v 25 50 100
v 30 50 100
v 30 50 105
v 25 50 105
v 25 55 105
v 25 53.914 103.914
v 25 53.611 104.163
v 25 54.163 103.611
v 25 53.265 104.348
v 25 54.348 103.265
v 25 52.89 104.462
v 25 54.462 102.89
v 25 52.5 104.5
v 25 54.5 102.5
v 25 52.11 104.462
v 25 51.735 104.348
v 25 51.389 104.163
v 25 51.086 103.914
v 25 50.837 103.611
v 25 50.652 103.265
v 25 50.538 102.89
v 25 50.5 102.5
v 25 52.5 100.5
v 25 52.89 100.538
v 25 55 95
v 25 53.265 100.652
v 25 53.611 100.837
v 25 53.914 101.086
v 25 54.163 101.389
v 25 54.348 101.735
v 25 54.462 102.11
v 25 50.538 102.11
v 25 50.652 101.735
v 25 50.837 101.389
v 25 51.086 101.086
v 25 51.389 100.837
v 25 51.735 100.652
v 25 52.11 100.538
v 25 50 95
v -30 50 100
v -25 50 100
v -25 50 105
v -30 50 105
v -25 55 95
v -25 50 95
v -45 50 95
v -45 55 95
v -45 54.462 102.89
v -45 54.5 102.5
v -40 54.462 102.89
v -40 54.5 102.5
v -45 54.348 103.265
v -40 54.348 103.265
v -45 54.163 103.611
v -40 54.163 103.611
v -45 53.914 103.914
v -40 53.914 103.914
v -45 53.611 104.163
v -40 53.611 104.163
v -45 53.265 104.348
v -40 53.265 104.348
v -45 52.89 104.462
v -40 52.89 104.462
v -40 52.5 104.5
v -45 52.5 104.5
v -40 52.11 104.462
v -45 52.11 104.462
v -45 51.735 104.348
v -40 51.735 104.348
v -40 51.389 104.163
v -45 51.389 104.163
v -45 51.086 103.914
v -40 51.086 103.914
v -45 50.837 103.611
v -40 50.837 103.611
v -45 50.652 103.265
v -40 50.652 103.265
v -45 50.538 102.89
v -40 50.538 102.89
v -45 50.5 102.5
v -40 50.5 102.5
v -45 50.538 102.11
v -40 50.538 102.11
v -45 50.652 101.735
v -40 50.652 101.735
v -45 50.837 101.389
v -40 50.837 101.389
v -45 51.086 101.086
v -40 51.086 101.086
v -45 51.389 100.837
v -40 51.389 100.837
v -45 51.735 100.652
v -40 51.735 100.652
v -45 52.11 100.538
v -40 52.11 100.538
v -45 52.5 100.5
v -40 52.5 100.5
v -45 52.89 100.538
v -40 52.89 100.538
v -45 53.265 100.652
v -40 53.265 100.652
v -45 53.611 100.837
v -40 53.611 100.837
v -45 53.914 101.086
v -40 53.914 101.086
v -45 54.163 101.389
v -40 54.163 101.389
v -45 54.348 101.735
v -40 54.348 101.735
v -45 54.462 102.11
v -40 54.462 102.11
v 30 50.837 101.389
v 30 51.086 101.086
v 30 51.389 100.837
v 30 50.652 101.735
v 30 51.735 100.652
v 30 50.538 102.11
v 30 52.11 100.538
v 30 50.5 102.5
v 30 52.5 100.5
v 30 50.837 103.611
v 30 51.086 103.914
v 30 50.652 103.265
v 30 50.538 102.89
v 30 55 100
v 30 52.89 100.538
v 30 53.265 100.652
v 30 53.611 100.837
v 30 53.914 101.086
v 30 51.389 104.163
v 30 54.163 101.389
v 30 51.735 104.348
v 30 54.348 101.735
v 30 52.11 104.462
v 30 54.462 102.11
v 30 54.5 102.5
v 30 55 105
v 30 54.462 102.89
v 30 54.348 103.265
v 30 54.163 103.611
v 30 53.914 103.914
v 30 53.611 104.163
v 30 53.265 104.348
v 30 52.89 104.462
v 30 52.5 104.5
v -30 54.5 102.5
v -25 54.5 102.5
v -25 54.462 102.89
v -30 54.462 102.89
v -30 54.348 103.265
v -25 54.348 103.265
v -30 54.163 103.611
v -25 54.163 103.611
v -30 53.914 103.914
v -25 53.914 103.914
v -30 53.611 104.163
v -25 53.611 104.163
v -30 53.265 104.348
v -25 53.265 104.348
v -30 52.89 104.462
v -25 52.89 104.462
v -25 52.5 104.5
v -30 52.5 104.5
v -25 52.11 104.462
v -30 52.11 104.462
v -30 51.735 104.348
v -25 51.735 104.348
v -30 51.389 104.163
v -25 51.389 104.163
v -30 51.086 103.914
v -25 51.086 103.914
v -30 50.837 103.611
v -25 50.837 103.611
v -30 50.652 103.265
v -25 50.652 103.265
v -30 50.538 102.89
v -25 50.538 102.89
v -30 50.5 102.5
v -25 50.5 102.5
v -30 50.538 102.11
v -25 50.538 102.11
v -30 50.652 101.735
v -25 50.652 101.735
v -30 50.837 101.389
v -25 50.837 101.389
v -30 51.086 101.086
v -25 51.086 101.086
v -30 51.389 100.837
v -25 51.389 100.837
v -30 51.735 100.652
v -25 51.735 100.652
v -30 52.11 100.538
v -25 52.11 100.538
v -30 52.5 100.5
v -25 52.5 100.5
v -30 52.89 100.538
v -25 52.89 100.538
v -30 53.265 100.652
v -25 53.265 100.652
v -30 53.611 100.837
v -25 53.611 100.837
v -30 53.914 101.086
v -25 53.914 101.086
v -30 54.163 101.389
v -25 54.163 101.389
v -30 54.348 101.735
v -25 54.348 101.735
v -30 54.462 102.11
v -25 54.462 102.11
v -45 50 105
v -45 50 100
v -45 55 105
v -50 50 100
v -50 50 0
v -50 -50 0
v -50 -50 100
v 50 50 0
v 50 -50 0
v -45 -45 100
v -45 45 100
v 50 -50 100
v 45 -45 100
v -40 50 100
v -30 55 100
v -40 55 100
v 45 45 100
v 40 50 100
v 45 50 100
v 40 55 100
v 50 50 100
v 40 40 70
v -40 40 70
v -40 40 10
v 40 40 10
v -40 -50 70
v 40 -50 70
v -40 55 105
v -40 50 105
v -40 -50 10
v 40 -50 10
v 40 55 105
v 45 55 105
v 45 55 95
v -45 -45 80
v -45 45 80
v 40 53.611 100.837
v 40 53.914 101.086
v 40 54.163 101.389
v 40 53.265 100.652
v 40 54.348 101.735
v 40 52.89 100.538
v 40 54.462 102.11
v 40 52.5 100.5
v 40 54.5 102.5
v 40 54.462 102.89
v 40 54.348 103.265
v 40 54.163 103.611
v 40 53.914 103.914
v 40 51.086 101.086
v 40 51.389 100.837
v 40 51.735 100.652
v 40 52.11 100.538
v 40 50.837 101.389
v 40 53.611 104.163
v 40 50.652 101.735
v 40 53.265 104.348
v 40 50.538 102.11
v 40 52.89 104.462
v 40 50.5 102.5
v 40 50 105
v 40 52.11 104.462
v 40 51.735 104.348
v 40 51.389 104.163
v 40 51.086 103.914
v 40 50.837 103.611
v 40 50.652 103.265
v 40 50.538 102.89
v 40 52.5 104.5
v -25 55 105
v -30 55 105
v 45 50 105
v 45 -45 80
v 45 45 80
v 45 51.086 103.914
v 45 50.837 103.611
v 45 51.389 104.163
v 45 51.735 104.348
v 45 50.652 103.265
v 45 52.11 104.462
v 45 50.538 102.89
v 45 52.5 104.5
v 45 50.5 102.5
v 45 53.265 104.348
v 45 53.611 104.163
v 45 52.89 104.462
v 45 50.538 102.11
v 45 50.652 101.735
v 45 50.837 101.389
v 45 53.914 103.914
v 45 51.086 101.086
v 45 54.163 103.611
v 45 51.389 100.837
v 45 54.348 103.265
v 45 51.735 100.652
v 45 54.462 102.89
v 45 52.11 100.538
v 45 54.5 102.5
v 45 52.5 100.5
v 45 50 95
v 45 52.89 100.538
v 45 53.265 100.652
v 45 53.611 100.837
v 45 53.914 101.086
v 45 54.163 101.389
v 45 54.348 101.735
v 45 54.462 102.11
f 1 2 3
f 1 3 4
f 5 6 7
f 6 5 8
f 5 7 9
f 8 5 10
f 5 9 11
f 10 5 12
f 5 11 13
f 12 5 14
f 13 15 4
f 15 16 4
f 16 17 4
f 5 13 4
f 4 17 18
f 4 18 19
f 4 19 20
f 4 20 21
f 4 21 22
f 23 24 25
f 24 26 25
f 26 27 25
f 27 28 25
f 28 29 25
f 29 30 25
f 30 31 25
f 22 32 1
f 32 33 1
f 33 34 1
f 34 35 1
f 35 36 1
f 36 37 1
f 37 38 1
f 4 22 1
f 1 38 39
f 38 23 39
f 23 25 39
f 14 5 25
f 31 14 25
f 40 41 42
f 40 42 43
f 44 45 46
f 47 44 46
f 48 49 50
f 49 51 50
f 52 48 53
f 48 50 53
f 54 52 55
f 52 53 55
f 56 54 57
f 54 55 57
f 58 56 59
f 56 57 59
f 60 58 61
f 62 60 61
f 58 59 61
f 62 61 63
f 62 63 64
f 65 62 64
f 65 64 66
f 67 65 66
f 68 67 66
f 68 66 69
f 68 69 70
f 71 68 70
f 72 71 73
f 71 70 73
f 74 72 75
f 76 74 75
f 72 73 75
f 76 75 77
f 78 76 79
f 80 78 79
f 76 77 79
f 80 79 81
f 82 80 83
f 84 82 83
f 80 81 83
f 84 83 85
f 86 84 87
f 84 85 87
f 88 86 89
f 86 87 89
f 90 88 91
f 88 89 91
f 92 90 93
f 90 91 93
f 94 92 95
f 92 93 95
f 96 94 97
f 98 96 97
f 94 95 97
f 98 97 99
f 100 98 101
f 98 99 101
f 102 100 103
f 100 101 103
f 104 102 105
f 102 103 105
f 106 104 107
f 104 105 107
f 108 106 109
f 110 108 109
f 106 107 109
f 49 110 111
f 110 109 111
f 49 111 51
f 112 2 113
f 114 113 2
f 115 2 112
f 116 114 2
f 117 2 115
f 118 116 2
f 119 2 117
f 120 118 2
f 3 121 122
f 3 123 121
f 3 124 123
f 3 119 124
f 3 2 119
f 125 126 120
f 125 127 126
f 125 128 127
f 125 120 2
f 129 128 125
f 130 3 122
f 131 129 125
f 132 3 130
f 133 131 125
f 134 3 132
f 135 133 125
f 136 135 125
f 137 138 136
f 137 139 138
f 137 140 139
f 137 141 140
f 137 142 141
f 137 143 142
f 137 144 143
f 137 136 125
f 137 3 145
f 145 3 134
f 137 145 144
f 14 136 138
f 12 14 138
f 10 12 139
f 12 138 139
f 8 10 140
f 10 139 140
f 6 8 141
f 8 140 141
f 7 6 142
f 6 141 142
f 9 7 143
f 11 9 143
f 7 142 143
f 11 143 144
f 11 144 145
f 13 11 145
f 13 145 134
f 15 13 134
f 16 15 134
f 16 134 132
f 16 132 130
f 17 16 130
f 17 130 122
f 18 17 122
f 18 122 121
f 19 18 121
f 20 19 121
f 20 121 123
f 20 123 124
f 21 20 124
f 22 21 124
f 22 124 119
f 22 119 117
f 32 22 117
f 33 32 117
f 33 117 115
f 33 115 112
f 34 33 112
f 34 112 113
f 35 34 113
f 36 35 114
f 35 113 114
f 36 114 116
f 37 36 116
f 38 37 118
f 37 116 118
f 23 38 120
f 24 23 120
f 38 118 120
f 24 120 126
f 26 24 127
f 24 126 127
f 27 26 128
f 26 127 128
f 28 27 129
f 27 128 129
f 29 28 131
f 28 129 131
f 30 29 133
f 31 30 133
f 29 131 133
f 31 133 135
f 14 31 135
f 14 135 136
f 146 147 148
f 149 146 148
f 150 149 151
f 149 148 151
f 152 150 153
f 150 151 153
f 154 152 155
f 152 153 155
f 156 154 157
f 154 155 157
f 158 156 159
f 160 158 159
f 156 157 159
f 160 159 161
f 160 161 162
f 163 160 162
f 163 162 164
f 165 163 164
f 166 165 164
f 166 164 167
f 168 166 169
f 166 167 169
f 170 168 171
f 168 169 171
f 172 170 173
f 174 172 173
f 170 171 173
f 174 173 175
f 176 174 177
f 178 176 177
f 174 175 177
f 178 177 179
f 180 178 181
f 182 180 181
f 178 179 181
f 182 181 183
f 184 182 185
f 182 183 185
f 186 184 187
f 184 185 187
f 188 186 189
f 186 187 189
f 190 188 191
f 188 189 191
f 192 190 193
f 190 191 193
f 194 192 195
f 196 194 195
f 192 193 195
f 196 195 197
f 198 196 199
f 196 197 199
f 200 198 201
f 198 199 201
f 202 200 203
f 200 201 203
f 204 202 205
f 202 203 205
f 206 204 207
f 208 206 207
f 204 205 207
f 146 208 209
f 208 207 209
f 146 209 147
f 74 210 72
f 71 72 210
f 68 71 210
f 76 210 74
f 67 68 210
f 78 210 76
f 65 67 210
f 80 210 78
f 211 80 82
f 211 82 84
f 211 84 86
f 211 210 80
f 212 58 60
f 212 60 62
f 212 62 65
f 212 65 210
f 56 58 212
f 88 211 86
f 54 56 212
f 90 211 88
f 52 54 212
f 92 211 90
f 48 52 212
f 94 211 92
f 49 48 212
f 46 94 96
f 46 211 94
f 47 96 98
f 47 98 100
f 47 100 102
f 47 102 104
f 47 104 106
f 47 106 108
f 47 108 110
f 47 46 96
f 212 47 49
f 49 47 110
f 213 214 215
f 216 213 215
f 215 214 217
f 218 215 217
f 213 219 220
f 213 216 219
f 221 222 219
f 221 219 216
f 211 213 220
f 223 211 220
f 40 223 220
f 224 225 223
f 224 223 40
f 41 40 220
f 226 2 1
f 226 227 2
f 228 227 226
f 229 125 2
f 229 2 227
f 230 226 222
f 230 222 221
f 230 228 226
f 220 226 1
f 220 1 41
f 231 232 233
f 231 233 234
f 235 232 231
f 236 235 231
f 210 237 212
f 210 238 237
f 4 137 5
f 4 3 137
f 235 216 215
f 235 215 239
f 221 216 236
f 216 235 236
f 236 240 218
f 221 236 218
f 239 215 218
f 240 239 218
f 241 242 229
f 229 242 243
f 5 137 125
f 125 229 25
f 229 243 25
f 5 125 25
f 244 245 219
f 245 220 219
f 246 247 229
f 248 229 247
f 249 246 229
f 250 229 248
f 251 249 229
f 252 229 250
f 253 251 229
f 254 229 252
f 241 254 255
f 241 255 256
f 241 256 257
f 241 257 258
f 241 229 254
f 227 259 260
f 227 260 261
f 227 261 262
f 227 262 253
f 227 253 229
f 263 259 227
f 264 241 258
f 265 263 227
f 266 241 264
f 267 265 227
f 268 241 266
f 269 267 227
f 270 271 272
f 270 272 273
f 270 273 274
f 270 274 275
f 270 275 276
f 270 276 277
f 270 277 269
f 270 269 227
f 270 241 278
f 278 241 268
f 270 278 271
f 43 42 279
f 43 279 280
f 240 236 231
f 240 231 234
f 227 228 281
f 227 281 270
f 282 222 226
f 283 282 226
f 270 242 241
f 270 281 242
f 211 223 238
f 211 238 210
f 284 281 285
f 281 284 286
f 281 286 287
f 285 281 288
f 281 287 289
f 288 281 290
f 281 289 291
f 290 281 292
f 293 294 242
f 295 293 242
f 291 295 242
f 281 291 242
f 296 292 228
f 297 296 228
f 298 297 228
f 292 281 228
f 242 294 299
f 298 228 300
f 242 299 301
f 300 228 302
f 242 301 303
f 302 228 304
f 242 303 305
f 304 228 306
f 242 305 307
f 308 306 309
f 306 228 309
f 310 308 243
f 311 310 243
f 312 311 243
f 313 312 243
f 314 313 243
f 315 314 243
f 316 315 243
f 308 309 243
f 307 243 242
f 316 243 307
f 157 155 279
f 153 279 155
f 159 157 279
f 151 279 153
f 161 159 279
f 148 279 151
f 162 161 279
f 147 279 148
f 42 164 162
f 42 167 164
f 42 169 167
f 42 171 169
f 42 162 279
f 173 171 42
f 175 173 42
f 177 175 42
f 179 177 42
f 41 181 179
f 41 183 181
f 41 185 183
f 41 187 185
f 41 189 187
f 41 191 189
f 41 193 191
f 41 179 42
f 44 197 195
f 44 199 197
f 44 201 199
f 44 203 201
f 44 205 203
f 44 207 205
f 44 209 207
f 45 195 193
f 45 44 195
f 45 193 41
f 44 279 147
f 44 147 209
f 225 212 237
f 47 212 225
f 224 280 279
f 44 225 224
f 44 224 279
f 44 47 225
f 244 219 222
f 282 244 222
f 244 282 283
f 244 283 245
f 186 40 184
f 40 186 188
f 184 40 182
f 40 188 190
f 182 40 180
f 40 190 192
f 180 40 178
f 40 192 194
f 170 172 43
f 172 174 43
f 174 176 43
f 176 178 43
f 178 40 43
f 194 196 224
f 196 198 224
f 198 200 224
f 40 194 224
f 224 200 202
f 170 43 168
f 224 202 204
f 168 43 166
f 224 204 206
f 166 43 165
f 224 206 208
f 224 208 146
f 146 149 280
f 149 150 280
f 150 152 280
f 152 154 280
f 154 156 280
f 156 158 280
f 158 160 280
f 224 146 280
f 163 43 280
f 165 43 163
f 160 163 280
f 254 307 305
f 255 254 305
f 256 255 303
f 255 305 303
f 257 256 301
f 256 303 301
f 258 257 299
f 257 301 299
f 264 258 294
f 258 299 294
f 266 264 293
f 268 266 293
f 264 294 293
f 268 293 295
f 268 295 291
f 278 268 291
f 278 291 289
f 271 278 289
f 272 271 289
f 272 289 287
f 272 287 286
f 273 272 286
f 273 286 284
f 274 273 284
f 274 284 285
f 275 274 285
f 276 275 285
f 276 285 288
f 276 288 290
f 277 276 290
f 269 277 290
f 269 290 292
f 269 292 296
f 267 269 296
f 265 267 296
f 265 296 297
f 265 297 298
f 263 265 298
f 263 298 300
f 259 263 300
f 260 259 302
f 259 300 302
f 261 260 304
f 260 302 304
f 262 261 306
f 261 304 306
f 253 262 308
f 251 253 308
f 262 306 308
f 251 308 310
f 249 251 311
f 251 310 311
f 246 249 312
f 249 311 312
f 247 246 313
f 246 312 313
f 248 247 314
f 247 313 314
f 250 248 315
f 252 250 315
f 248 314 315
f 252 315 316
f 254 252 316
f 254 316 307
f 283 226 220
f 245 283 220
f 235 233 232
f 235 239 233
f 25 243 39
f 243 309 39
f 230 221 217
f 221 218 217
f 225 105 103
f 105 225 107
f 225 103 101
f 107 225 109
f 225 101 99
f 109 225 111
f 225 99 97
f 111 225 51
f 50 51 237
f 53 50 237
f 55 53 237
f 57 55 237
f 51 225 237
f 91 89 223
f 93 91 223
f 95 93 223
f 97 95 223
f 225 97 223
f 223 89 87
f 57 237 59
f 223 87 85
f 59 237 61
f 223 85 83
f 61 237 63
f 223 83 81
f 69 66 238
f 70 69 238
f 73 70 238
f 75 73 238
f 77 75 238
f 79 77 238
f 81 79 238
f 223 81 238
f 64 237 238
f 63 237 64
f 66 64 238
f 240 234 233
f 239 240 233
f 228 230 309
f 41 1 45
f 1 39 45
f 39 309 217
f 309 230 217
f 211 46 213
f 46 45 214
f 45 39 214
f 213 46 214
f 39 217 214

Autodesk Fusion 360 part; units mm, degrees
sketch "Sketch1" plane through (0, 0, 0) normal (0, 0, 1) x (1, 0, 0)
  line L0 (50, 50) -> (-50, 50)
  line L1 (-50, 50) -> (-50, -50)
  line L2 (-50, -50) -> (50, -50)
  line L3 (50, -50) -> (50, 50)
  line L4 (50, 50) -> (-50, -50) construction
  line L5 (-50, 50) -> (50, -50) construction
  dimension "d1" = 100
  dimension "d2" = 100
extrude "Extrude1" add sketch "Sketch1" along normal blind 100
sketch "Sketch2" plane through (0, 0, 100) normal (0, 0, 1) x (-1, 0, 0)
  line L0 (-50, 50) -> (-50, -50)
  line L1 (-50, -50) -> (50, -50)
  line L2 (50, -50) -> (50, 50)
  line L3 (50, 50) -> (-50, 50)
  line L4 (-45, -45) -> (45, -45)
  line L5 (45, -45) -> (45, 45)
  line L6 (45, 45) -> (-45, 45)
  line L7 (-45, 45) -> (-45, -45)
  line L8 (-45, -45) -> (45, 45) construction
  line L9 (45, -45) -> (-45, 45) construction
  dimension "d6" = 90
  dimension "d7" = 90
extrude "Extrude2" cut sketch "Sketch2" against normal blind 20 contours L4 L5 L6 L7
sketch "Sketch3" plane through (0, -50, 0) normal (0, -1, 0) x (1, 0, 0)
  line L0 (-50, 0) -> (50, 0)
  line L1 (50, 0) -> (50, 100)
  line L2 (50, 100) -> (-50, 100)
  line L3 (-50, 100) -> (-50, 0)
  line L4 (-40, 10) -> (-40, 40)
  line L5 (-40, 40) -> (40, 40)
  line L6 (40, 40) -> (40, 10)
  line L7 (40, 10) -> (-40, 10)
  line L8 (-40, 70) -> (40, 70)
  line L9 (40, 70) -> (40, 40)
  line L10 (-40, 40) -> (-40, 70)
extrude "Extrude3" cut sketch "Sketch3" against normal blind 90 contours L4 L5 L6 L7 | L5 L8 L9 L10
sketch "Sketch4" plane through (0, 0, 100) normal (0, 0, 1) x (-1, 0, 0)
  line L0 (45, -45) -> (-45, -45)
  line L1 (-45, -45) -> (-45, 45)
  line L2 (-45, 45) -> (45, 45)
  line L3 (45, 45) -> (45, -45)
  line L4 (-50, 50) -> (-50, -50)
  line L5 (-50, -50) -> (50, -50)
  line L6 (50, -50) -> (50, 50)
  line L7 (50, 50) -> (-50, 50)
  line L8 (45, -50) -> (45, -55)
  line L9 (-45, -50) -> (-45, -55)
  line L10 (-45, -55) -> (-25, -55)
  line L11 (-25, -55) -> (-25, -50)
  line L12 (45, -55) -> (25, -55)
  line L13 (25, -55) -> (25, -50)
  dimension "d12" = 5
  dimension "d13" = 5
  dimension "d14" = 20
  dimension "d15" = 20
extrude "Extrude4" add sketch "Sketch4" along normal mid plane 10 contours L5 L9 L10 L11 | L5 L8 L12 L13
sketch "Sketch5" plane through (0, 0, 105) normal (0, 0, 1) x (-1, 0, 0)
  line L0 (-45, -50) -> (-45, -55)
  line L1 (-45, -55) -> (-25, -55)
  line L2 (-25, -55) -> (-25, -50)
  line L3 (-25, -50) -> (-45, -50)
  line L4 (-25, -55) -> (-30, -55)
  line L5 (-30, -55) -> (-40, -55)
  line L6 (-40, -55) -> (-40, -50)
  line L7 (-30, -50) -> (-30, -55)
  line L8 (25, -55) -> (30, -55)
  line L9 (30, -55) -> (40, -55)
  line L10 (40, -55) -> (40, -50)
  line L11 (40, -50) -> (30, -50)
  line L12 (30, -50) -> (30, -55)
extrude "Extrude5" cut sketch "Sketch5" against normal blind 5 contours L1 L3 L5 L6 L7 | L9 L10 L11 L12
sketch "Sketch9" plane through (45, 0, 0) normal (1, 0, 0) x (0, 1, 0)
  line L0 (55, 95) -> (55, 105)
  line L1 (55, 105) -> (50, 105)
  line L2 (50, 105) -> (50, 100)
  line L3 (50, 100) -> (50, 95)
  line L4 (50, 95) -> (55, 95)
  circle A0 centre (52.5, 102.5) radius 2
extrude "Extrude7" cut sketch "Sketch9" against normal blind 130 contours A0
